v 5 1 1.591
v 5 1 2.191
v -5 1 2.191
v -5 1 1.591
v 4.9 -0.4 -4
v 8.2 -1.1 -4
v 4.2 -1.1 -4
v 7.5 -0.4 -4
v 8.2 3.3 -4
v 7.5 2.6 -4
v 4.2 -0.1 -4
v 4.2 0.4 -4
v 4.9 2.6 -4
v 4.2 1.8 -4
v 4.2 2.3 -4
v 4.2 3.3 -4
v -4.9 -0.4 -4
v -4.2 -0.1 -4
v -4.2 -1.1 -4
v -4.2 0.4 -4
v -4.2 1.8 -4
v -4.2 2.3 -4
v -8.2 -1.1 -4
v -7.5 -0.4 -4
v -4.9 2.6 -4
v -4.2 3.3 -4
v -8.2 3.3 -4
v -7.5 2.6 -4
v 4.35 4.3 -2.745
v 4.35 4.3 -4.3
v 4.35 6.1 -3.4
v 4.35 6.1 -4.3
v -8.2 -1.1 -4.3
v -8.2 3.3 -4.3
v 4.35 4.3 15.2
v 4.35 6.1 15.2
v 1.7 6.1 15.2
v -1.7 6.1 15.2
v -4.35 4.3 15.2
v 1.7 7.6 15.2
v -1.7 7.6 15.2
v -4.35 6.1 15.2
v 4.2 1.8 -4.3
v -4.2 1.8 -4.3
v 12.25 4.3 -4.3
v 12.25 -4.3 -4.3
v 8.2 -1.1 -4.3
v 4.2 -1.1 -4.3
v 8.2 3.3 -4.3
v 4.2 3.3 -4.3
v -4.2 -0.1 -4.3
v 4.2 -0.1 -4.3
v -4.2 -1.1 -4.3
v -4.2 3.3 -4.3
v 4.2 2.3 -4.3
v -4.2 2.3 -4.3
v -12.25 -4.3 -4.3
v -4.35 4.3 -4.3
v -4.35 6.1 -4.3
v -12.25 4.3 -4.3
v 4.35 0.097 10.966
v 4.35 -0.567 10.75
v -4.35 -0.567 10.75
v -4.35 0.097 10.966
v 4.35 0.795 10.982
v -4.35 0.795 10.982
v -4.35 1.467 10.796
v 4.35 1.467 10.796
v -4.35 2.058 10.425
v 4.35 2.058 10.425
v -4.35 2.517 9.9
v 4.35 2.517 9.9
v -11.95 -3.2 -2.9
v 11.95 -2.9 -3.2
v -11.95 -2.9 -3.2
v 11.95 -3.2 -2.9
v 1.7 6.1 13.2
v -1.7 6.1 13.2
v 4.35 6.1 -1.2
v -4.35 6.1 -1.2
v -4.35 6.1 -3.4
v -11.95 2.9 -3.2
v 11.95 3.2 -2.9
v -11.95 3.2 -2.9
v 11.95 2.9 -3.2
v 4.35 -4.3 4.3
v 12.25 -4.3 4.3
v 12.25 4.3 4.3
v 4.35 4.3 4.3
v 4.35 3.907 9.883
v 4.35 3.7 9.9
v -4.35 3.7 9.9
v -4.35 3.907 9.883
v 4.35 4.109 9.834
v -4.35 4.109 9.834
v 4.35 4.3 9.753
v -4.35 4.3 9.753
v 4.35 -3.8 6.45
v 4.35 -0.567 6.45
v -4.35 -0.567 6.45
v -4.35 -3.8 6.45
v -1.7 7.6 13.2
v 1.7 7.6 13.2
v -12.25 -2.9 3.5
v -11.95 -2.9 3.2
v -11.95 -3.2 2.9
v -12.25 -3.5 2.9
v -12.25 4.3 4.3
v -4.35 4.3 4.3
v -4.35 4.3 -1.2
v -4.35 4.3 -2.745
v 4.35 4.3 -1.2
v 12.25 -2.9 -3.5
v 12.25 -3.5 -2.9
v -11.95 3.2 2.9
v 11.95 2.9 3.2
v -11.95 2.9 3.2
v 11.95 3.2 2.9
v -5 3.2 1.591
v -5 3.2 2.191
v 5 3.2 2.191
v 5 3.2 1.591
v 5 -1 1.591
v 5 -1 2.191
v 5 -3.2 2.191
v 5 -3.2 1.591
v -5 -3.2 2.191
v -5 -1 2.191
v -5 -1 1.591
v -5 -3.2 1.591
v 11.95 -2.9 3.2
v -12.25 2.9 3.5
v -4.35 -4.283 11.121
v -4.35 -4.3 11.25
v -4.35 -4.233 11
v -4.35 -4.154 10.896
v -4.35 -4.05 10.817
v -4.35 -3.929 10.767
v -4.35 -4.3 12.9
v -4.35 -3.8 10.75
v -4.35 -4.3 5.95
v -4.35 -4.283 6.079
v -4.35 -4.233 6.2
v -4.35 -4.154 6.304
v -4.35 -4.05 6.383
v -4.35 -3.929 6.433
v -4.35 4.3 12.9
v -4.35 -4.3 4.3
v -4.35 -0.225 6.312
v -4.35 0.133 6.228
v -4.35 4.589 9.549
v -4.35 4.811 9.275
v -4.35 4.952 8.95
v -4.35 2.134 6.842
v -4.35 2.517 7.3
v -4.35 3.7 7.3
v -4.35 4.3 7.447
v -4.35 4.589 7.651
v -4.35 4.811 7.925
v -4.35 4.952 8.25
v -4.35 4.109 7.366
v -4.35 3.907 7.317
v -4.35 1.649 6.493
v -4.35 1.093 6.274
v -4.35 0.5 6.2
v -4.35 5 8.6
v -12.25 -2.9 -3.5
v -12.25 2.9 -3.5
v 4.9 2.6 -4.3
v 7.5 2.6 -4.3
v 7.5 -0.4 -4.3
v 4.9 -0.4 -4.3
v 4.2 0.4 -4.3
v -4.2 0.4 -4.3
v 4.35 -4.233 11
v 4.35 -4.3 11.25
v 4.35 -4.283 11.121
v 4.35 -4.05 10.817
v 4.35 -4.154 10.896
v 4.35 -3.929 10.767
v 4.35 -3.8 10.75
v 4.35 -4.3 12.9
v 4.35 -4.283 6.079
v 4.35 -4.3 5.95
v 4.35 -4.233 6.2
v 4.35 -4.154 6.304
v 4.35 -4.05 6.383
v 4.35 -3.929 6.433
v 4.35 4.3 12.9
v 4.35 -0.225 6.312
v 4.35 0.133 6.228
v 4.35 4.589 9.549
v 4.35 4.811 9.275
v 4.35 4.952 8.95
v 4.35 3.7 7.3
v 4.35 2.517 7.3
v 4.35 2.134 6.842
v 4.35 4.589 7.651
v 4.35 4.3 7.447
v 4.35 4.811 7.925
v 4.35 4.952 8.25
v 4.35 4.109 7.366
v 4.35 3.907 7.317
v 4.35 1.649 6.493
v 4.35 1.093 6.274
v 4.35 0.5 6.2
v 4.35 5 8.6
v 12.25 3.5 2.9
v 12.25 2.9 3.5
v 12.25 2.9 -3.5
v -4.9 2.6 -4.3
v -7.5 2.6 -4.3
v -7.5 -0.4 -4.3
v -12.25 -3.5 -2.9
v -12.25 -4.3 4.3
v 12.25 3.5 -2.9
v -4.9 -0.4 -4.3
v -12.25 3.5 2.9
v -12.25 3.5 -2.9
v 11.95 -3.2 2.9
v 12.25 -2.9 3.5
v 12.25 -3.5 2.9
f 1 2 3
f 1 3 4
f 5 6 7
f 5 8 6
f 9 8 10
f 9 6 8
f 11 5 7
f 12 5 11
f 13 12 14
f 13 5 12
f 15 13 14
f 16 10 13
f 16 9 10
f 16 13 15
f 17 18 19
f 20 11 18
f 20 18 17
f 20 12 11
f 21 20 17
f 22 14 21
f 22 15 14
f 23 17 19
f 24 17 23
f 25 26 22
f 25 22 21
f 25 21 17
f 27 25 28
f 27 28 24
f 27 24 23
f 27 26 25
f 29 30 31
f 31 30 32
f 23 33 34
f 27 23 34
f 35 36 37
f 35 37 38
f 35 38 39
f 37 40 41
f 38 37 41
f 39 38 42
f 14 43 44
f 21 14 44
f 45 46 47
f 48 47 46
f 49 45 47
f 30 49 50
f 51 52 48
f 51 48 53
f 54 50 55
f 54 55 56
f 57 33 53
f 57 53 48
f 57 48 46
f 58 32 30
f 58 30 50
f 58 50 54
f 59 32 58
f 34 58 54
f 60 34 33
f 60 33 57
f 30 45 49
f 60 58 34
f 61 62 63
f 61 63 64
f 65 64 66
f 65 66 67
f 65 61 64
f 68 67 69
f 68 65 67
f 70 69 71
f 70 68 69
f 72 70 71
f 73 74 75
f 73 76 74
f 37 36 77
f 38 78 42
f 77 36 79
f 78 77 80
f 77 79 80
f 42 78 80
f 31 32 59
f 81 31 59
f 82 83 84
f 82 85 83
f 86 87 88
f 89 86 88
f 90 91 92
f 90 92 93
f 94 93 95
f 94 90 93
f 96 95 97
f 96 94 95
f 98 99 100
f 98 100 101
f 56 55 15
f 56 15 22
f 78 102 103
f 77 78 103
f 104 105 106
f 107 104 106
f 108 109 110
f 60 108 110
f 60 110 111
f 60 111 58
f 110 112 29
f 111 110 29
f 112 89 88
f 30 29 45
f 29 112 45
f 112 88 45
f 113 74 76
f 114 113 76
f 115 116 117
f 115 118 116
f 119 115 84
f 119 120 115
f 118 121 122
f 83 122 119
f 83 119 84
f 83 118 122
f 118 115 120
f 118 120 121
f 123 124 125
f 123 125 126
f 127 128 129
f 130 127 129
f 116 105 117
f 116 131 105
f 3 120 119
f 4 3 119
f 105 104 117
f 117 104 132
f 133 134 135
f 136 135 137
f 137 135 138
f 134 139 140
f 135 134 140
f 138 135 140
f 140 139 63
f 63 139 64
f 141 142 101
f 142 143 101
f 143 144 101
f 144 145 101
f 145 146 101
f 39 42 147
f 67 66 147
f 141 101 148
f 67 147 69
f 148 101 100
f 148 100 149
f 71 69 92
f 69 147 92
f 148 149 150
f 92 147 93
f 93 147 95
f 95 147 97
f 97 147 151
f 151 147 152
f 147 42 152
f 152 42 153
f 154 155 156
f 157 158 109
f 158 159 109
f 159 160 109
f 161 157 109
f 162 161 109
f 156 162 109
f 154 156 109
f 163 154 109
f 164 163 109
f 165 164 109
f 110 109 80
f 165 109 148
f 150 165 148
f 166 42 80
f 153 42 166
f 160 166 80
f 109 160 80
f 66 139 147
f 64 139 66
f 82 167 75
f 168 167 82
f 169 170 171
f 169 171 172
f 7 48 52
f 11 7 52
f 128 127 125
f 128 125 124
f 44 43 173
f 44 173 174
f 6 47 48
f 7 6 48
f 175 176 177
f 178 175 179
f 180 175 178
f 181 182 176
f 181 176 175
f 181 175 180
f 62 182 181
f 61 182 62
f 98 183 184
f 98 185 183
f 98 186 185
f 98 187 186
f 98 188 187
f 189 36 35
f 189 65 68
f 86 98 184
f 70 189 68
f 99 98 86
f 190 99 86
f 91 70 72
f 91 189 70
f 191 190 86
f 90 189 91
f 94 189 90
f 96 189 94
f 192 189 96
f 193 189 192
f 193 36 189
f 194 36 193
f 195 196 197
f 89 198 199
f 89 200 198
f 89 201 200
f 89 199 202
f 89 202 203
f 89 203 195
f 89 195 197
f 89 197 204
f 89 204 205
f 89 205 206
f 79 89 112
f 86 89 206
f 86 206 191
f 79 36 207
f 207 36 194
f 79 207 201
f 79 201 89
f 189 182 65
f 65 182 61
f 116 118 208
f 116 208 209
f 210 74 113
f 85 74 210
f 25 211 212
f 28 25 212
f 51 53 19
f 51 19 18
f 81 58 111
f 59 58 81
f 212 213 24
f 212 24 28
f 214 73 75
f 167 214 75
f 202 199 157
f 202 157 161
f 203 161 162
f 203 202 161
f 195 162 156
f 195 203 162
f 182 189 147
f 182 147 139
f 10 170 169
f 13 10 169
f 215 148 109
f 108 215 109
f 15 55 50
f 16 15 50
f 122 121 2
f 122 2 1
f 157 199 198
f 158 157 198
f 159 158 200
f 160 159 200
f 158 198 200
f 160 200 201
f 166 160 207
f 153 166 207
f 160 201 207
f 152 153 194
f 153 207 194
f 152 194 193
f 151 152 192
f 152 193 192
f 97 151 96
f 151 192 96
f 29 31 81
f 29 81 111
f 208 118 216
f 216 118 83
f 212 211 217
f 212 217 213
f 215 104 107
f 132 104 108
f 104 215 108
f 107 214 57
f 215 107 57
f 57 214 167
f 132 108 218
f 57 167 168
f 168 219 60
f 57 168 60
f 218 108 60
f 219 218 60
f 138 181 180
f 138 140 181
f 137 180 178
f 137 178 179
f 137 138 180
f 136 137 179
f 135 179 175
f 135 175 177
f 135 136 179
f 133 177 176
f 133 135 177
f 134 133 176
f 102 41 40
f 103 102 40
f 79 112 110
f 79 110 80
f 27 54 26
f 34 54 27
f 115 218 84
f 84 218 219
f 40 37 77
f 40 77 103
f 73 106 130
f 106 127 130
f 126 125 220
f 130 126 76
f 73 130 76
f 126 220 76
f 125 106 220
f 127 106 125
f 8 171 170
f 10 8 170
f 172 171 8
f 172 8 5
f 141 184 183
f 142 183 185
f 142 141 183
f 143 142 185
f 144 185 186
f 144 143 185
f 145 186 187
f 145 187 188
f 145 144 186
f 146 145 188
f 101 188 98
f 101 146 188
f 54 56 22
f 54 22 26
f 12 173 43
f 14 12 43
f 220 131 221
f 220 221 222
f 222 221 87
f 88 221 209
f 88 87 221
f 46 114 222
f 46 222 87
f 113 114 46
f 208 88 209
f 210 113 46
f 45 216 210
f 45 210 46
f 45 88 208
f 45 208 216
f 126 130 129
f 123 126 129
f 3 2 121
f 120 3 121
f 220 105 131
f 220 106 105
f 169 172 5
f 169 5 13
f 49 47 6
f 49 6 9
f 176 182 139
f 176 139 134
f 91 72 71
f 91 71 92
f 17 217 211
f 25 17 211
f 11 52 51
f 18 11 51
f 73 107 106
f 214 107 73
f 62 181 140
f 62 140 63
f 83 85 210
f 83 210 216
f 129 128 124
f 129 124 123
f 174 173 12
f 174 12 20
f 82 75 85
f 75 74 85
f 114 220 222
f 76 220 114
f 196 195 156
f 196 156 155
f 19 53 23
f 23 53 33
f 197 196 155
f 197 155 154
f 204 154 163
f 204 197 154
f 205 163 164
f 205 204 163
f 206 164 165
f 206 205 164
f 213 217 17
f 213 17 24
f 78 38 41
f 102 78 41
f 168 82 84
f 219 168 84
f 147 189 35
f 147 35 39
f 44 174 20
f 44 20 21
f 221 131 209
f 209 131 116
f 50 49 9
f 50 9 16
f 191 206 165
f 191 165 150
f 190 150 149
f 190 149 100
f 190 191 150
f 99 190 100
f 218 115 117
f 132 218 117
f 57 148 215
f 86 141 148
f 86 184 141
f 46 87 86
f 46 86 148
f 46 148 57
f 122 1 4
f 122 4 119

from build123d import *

# Parameters (mm, degrees)
SKETCH2_W           = 8.6
SKETCH2_H           = 8.6
SKETCH2_W_2         = 6.4
SKETCH2_H_2         = 6.4
EXTRUDE_THIN1_DEPTH = 12.25
CHAMFER1_SIZE       = 0.3
BOSS_EXTRUDE1_START = -12.25
SKETCH3_W           = 0.6
SKETCH3_H           = 2.2
BOSS_EXTRUDE1_DEPTH = 5
SKETCH4_W           = 8.7
SKETCH4_H           = 1.8
BOSS_EXTRUDE2_DEPTH = 19.5
CUT_EXTRUDE1_REACH  = 25.32
SKETCH5_W           = 1.5
SKETCH5_H           = 1.8
CHAMFER2_SIZE       = 0.7
CHAMFER2_SIZE_2     = 1.923234194
SKETCH6_W           = 3.4
SKETCH6_H           = 1.5
BOSS_EXTRUDE3_DEPTH = 2
BOSS_EXTRUDE4_DEPTH = 8.7
CUT_EXTRUDE2_REACH  = 25.756
FILLET1_R           = 0.5
SKETCH8_W           = 4
SKETCH8_H           = 4.4
SKETCH8_W_2         = 2.6
SKETCH8_H_2         = 3
SKETCH8_W_3         = 8.4
SKETCH8_H_3         = 0.5
CUT_EXTRUDE3_DEPTH  = 0.3


with BuildPart() as part:
    # Sketch2 → Extrude-Thin1 (new, symmetric)
    with BuildSketch(Plane(origin=(0, 0, 0), x_dir=(0, 0, -1), z_dir=(1, 0, 0))):
        Rectangle(SKETCH2_W, SKETCH2_H)
        Rectangle(SKETCH2_W_2, SKETCH2_H_2, mode=Mode.SUBTRACT)
    extrude(amount=EXTRUDE_THIN1_DEPTH, both=True)

    # Chamfer1
    chamfer1_edges = [part.edges().sort_by_distance(p)[0] for p in [
        (-12.25, 0, -3.2),
        (0, -3.2, -3.2),
        (-12.25, 3.2, 0),
        (0, 3.2, -3.2),
        (-12.25, 0, 3.2),
        (0, 3.2, 3.2),
        (-12.25, -3.2, 0),
        (0, -3.2, 3.2),
        (12.25, 0, -3.2),
        (12.25, 3.2, 0),
        (12.25, 0, 3.2),
        (12.25, -3.2, 0),
    ]]
    chamfer(chamfer1_edges, length=CHAMFER1_SIZE)

    # Sketch3 → Boss-Extrude1 (add, symmetric)
    with BuildSketch(Plane(origin=(12.25, 0, 0), x_dir=(0, 0, -1), z_dir=(1, 0, 0)).offset(BOSS_EXTRUDE1_START)):
        with Locations((-1.891287847, 2.1)):
            Rectangle(SKETCH3_W, SKETCH3_H)
        with Locations((-1.891287847, -2.1)):
            Rectangle(SKETCH3_W, SKETCH3_H)
    extrude(amount=BOSS_EXTRUDE1_DEPTH, both=True)

    # Sketch4 → Boss-Extrude2 (add)
    with BuildSketch(Plane(origin=(0, 0, -4.3), x_dir=(-1, 0, 0), z_dir=(0, 0, -1))):
        with Locations((0, 5.2)):
            Rectangle(SKETCH4_W, SKETCH4_H)
    extrude(amount=-BOSS_EXTRUDE2_DEPTH)

    # Sketch5 → Cut-Extrude1 (cut, up to next)
    with BuildSketch(Plane(origin=(4.35, 0, 0), x_dir=(0, 0, -1), z_dir=(1, 0, 0)), mode=Mode.PRIVATE) as cut_extrude1_sk1:
        with Locations((1.95, 5.2)):
            Rectangle(SKETCH5_W, SKETCH5_H)
    cut_extrude1_tool1 = extrude(cut_extrude1_sk1.sketch, amount=-CUT_EXTRUDE1_REACH, mode=Mode.PRIVATE) & part.part
    add(cut_extrude1_tool1.solids().sort_by_distance((4.35, 5.2, -1.95))[0], mode=Mode.SUBTRACT)

    # Chamfer2
    # the kernel refuses this chamfer: 1.923234194, 0.7 mm, written as the material it takes off along each edge
    with BuildSketch(Plane(origin=(9.339244015, 6.1, -2.7), x_dir=(0, 0.09904090225205073, -0.9950833631817486), z_dir=(-1, 0, 0))) as chamfer2_piece_1_section:
        Polygon((CHAMFER2_SIZE * 0.995083363182, CHAMFER2_SIZE * 0.0990409022521), (-CHAMFER2_SIZE_2 * 0.0990409022324, CHAMFER2_SIZE_2 * 0.995083362984), (0, 0), align=None)
    chamfer2_piece_1 = extrude(amount=18.678488029, mode=Mode.PRIVATE)
    chamfer2_piece_1 = split(chamfer2_piece_1, bisect_by=Plane(origin=(0, 4.3, -2.919451718), z_dir=(0, 1, 0)), keep=Keep.TOP, mode=Mode.PRIVATE)
    add(chamfer2_piece_1, mode=Mode.SUBTRACT)

    # Sketch6 → Boss-Extrude3 (add)
    with BuildSketch(Plane.XY.offset(15.2)):
        with Locations((0, 6.85)):
            Rectangle(SKETCH6_W, SKETCH6_H)
    extrude(amount=-BOSS_EXTRUDE3_DEPTH)

    # Sketch7 → Boss-Extrude4 (add)
    with BuildSketch(Plane(origin=(4.35, 0, 0), x_dir=(0, 0, -1), z_dir=(1, 0, 0))):
        with BuildLine():
            ThreePointArc((-9.9, 3.7), (-9.862781283, 4.008842082), (-9.753256259, 4.3))
            Line((-9.753256259, 4.3), (-12.9, 4.3))
            Line((-12.9, 4.3), (-12.9, -4.3))
            Line((-12.9, -4.3), (-10.75, -4.3))
            Line((-10.75, -4.3), (-10.75, -0.56653645))
            ThreePointArc((-10.75, -0.56653645), (-10.913726036, 1.137708265), (-9.9, 2.5174241))
            Line((-9.9, 2.5174241), (-9.9, 3.7))
        make_face()
        with BuildLine():
            Line((-4.3, -4.3), (-4.3, 4.3))
            Line((-4.3, 4.3), (-7.446743741, 4.3))
            ThreePointArc((-7.446743741, 4.3), (-7.337218717, 4.008842082), (-7.3, 3.7))
            Line((-7.3, 3.7), (-7.3, 2.5174241))
            ThreePointArc((-7.3, 2.5174241), (-6.492869249, 1.648912529), (-6.2, 0.5))
            ThreePointArc((-6.2, 0.5), (-6.263335711, -0.047722558), (-6.45, -0.56653645))
            Line((-6.45, -0.56653645), (-6.45, -4.3))
            Line((-6.45, -4.3), (-4.3, -4.3))
        make_face()
    extrude(amount=-BOSS_EXTRUDE4_DEPTH)

    # Sketch7<3> → Cut-Extrude2 (cut, up to next)
    with BuildSketch(Plane(origin=(4.35, 0, 0), x_dir=(0, 0, -1), z_dir=(1, 0, 0)), mode=Mode.PRIVATE) as cut_extrude2_sk1:
        with BuildLine():
            Line((-9.753256259, 4.3), (-7.446743741, 4.3))
            ThreePointArc((-7.446743741, 4.3), (-8.6, 5), (-9.753256259, 4.3))
        make_face()
    cut_extrude2_tool1 = extrude(cut_extrude2_sk1.sketch, amount=-CUT_EXTRUDE2_REACH, mode=Mode.PRIVATE) & part.part
    add(cut_extrude2_tool1.solids().sort_by_distance((4.35, 4.587672, 8.6))[0], mode=Mode.SUBTRACT)

    # Fillet1
    fillet1_edges = [part.edges().sort_by_distance(p)[0] for p in [
        (0, -4.3, 10.75),
        (0, -4.3, 6.45),
    ]]
    fillet(fillet1_edges, radius=FILLET1_R)

    # Sketch8 → Cut-Extrude3 (cut)
    # profile 1 of 4: a face of its own
    with BuildSketch(Plane(origin=(0, 0, -4.3), x_dir=(-1, 0, 0), z_dir=(0, 0, -1))):
        with Locations((-6.2, 1.1)):
            Rectangle(SKETCH8_W, SKETCH8_H)
        with Locations((-6.2, 1.1)):
            Rectangle(SKETCH8_W_2, SKETCH8_H_2, mode=Mode.SUBTRACT)
    # profile 2 of 4: a face of its own
    with BuildSketch(Plane(origin=(0, 0, -4.3), x_dir=(-1, 0, 0), z_dir=(0, 0, -1))):
        with Locations((0, 2.05)):
            Rectangle(SKETCH8_W_3, SKETCH8_H_3)
    # profile 3 of 4: a face of its own
    with BuildSketch(Plane(origin=(0, 0, -4.3), x_dir=(-1, 0, 0), z_dir=(0, 0, -1))):
        with Locations((0, 0.15)):
            Rectangle(SKETCH8_W_3, SKETCH8_H_3)
    # profile 4 of 4: a face of its own
    with BuildSketch(Plane(origin=(0, 0, -4.3), x_dir=(-1, 0, 0), z_dir=(0, 0, -1))):
        with Locations((6.2, 1.1)):
            Rectangle(SKETCH8_W, SKETCH8_H)
        with Locations((6.2, 1.1)):
            Rectangle(SKETCH8_W_2, SKETCH8_H_2, mode=Mode.SUBTRACT)
    extrude(amount=-CUT_EXTRUDE3_DEPTH, mode=Mode.SUBTRACT)


solid = part.part
